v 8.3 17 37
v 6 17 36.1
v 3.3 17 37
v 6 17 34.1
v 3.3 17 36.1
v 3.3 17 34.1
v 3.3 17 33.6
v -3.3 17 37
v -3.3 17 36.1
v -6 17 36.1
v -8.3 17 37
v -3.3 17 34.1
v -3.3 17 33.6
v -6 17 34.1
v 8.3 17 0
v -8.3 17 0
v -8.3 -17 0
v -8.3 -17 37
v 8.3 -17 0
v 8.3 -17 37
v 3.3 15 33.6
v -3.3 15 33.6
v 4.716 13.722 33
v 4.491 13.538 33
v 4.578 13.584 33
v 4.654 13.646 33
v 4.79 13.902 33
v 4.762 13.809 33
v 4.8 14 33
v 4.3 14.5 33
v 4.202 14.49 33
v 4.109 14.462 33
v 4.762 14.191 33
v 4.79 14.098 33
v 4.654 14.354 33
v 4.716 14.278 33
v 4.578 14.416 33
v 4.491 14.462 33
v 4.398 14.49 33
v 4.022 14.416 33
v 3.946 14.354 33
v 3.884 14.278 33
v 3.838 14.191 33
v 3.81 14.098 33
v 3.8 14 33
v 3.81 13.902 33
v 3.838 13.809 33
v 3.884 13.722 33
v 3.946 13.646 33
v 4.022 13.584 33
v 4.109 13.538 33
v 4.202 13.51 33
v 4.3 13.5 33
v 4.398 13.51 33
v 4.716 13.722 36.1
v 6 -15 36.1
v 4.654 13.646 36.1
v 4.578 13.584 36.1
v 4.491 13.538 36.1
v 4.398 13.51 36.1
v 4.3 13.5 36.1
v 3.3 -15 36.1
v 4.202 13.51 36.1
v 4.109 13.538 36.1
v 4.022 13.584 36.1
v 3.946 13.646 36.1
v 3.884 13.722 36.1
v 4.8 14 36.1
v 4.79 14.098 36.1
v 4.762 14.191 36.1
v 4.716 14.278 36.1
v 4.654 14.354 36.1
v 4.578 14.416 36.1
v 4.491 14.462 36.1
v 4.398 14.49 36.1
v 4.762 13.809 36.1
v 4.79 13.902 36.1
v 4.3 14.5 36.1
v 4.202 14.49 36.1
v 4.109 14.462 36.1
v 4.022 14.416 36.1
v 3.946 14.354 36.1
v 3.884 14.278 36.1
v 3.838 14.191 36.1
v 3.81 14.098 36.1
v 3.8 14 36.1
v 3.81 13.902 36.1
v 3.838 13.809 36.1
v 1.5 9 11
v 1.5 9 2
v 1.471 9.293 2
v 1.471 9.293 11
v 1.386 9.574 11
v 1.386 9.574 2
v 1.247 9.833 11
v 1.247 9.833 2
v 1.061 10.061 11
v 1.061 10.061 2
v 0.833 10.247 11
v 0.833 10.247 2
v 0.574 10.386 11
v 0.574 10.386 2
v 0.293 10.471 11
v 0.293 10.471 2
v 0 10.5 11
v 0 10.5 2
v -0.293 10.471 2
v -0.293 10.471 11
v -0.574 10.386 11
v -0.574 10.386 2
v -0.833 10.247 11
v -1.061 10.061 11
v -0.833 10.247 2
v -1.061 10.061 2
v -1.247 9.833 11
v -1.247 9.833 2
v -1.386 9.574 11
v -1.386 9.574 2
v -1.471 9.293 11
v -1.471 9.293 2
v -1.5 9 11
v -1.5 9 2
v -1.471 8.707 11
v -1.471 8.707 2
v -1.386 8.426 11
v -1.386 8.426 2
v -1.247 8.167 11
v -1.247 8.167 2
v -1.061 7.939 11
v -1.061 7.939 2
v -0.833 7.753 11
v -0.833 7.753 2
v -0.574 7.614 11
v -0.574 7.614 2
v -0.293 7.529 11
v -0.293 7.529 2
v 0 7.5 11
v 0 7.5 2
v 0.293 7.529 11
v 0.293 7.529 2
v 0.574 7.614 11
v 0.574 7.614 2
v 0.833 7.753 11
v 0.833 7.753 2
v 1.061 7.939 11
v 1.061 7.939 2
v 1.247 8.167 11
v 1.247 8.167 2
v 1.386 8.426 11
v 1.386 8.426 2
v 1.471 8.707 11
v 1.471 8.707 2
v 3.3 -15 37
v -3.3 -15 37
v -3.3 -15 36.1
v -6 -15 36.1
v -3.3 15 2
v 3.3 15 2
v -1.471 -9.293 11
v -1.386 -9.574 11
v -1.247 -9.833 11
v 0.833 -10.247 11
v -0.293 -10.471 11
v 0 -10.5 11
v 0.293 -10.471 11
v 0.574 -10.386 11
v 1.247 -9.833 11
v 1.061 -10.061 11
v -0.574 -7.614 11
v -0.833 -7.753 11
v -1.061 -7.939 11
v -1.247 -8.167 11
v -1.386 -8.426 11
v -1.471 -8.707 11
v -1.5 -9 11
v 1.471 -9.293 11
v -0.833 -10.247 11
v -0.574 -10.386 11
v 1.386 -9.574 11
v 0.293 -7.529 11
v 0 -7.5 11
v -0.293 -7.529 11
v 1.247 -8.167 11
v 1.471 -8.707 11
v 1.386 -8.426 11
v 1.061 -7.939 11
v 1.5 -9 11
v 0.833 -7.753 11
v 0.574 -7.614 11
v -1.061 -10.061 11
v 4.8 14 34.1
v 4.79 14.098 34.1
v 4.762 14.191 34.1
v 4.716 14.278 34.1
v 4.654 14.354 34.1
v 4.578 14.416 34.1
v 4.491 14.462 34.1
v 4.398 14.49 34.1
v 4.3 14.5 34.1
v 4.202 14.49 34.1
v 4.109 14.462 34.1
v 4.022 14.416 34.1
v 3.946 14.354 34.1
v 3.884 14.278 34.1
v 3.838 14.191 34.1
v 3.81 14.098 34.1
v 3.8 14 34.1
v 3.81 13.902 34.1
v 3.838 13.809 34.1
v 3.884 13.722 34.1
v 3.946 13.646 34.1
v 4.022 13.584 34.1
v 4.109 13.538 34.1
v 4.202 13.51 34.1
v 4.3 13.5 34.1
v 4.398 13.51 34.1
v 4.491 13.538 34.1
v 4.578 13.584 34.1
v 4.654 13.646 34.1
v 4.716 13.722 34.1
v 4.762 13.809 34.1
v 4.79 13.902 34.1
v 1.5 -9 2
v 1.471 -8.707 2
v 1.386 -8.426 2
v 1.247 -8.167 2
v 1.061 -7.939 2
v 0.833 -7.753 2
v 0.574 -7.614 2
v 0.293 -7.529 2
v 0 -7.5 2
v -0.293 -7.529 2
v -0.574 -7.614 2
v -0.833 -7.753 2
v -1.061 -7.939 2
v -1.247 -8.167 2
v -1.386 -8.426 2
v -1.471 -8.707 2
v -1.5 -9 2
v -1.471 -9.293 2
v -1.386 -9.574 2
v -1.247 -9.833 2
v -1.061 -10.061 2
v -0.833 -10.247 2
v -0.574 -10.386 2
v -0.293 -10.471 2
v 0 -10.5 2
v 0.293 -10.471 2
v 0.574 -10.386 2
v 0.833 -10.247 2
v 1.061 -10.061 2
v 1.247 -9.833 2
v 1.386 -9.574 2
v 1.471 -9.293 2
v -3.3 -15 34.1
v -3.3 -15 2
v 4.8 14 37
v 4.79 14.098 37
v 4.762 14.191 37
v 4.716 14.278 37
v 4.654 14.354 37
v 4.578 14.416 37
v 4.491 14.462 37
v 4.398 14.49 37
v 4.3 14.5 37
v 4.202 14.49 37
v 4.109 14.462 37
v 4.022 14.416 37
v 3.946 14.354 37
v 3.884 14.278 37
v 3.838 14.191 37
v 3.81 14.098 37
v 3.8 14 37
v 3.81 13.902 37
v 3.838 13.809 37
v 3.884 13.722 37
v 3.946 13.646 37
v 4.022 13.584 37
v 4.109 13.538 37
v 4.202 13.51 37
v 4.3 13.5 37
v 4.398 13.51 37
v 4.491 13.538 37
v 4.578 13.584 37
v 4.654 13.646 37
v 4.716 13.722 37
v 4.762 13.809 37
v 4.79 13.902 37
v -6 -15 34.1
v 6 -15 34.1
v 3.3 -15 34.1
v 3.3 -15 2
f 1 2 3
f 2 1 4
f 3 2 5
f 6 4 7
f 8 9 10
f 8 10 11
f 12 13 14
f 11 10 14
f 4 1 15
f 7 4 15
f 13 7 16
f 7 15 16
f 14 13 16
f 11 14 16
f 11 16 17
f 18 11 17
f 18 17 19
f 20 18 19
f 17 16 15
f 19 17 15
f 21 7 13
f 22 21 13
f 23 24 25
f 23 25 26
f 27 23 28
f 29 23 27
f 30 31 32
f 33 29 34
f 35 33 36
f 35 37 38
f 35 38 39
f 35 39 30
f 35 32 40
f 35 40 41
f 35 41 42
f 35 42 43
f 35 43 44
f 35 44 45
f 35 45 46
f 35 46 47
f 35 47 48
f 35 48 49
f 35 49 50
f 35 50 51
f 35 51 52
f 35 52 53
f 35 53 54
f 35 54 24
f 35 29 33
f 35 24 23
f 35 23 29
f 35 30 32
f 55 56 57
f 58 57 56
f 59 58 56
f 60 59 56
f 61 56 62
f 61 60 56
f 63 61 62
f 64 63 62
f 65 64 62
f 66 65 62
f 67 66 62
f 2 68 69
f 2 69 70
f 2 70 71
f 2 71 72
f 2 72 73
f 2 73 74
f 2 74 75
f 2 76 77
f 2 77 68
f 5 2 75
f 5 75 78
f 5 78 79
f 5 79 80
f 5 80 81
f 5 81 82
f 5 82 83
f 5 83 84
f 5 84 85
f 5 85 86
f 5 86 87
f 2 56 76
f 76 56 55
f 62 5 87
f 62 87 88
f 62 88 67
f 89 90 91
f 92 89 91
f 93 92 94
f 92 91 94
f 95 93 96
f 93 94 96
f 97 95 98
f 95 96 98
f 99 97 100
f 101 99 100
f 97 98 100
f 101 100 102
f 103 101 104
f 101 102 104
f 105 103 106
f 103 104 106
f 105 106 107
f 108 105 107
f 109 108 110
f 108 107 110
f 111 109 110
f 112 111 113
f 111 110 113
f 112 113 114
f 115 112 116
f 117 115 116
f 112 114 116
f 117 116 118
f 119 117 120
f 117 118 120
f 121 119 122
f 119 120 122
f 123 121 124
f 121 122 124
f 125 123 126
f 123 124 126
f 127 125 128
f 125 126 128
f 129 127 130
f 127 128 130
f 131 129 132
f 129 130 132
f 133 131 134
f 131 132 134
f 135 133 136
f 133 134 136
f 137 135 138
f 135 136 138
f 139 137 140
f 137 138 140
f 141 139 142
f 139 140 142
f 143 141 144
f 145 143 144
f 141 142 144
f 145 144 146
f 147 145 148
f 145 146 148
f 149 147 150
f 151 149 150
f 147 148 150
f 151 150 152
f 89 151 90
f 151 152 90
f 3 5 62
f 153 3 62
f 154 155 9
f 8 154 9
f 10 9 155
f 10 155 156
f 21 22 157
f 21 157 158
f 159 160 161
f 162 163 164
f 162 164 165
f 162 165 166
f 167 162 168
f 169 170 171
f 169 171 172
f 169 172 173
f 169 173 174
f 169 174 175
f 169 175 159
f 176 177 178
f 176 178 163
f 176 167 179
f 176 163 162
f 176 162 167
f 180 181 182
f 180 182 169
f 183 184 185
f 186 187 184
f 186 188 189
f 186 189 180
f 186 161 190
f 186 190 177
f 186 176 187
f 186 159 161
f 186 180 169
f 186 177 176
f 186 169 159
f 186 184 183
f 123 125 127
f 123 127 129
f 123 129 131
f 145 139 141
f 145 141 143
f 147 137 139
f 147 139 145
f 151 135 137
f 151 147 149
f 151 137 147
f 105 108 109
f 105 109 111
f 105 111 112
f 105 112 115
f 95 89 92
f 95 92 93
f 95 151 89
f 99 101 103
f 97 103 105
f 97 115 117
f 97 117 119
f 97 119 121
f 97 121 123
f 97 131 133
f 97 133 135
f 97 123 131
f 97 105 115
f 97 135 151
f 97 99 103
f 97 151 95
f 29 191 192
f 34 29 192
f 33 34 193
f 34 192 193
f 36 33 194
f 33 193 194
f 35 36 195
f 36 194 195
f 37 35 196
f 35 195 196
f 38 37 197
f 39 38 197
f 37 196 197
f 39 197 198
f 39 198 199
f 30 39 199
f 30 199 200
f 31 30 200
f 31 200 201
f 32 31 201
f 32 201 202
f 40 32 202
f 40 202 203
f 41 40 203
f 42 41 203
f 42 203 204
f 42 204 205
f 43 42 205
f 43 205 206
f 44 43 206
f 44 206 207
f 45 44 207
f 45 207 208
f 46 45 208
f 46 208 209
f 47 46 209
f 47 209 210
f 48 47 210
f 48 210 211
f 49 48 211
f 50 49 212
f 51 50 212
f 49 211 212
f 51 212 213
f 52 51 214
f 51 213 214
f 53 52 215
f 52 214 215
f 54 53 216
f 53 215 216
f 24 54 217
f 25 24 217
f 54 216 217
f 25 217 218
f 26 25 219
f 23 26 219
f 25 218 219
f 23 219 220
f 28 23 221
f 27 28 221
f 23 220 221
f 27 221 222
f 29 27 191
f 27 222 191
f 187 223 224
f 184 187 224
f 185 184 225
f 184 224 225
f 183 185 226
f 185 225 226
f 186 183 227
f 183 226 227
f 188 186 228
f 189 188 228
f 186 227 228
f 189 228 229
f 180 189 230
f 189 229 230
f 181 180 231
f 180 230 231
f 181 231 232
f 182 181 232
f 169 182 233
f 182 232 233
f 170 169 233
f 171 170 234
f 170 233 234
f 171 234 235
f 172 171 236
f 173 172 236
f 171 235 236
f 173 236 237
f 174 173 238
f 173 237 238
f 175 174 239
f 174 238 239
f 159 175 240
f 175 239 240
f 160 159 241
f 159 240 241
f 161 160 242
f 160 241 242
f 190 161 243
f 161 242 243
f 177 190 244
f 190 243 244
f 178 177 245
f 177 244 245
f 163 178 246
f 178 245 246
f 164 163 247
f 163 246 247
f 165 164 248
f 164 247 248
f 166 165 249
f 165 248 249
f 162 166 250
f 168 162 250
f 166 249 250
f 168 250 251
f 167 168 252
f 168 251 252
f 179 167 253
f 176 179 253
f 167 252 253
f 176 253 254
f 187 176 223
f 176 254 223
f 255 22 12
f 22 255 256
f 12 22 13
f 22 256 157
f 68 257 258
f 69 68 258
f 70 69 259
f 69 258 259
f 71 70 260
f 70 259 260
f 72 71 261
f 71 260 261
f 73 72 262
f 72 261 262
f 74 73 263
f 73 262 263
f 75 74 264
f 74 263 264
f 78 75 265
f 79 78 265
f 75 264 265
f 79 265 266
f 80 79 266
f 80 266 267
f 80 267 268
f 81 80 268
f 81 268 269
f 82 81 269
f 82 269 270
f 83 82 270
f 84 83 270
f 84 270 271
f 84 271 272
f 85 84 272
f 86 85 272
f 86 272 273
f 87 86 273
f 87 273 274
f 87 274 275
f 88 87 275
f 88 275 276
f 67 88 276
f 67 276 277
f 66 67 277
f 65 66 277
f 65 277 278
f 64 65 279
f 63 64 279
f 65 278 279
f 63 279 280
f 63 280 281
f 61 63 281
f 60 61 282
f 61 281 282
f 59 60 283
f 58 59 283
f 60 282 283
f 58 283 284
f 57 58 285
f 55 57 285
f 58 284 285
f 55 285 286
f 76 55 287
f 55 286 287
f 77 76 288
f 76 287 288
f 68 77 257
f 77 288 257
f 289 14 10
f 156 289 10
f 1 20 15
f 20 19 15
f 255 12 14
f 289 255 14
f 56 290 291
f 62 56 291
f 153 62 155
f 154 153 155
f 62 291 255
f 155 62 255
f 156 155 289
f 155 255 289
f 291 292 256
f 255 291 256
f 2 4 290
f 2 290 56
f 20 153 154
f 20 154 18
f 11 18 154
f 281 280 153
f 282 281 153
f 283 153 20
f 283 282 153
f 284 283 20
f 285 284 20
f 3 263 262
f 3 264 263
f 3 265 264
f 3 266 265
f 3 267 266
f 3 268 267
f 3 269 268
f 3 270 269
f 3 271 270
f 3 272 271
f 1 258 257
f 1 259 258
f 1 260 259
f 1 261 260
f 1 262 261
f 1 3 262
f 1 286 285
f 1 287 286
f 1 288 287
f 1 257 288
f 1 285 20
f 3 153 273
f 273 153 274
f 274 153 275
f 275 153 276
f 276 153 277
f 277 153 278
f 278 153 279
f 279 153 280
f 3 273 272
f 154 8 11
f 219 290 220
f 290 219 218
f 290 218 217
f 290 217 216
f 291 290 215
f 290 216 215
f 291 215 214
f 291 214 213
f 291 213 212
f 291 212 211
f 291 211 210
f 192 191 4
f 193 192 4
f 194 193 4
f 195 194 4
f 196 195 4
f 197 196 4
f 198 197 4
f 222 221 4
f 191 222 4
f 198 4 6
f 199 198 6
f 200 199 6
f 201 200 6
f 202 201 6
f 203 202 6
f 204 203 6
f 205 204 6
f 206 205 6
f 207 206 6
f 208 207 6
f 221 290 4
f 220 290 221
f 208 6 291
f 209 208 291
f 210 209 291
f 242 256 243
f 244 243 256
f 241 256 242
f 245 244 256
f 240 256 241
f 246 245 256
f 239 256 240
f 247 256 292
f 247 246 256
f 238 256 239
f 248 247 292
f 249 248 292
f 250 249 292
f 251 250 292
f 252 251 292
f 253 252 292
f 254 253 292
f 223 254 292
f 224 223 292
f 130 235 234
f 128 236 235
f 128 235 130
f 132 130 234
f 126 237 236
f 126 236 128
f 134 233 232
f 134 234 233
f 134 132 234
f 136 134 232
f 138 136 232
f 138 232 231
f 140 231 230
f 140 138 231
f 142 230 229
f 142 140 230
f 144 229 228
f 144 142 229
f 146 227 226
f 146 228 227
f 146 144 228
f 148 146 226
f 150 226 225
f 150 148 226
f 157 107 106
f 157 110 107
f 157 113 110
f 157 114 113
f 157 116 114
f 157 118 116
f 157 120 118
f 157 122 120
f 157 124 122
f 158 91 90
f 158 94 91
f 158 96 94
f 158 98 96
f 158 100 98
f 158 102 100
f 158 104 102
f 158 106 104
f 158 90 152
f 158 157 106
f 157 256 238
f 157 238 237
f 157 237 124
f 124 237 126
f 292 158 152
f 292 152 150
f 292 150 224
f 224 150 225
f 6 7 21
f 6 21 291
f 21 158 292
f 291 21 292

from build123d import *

# Parameters (mm, degrees)
F0_W      = 6.6
F0_H      = 30
F1_DEPTH  = 2
F0_W_2    = 16.6
F0_H_2    = 34
F2_DEPTH  = 34
F3_R      = 1.5
F4_DEPTH  = 9
F5_W      = 6.6
F5_H      = 0.4
F6_DEPTH  = 25
F8_DEPTH  = 3
F9_W      = 12
F9_H      = 2
F10_DEPTH = 32
F11_R     = 0.5
F12_DEPTH = 4


with BuildPart() as f1:
    # F0 (on Top) → F1 (new body)
    with BuildSketch(Plane.XY):
        Rectangle(F0_W, F0_H)
    extrude(amount=F1_DEPTH)

    # F0 (on Top) → F2 (join)
    with BuildSketch(Plane.XY):
        Rectangle(F0_W_2, F0_H_2)
        Rectangle(F0_W, F0_H, mode=Mode.SUBTRACT)
    extrude(amount=F2_DEPTH)

    # F3 (on face) → F4 (join)
    with BuildSketch(Plane.XY.offset(2)):
        with Locations((0, 9)):
            Circle(F3_R)
        with Locations((0, -9)):
            Circle(F3_R)
    extrude(amount=F4_DEPTH)

    # F5 (on face) → F6 (cut)
    with BuildSketch(Plane(origin=(0, 17, 0), x_dir=(-1, 0, 0), z_dir=(0, 1, 0))):
        with Locations((0, 33.8)):
            Rectangle(F5_W, F5_H)
    extrude(amount=-F6_DEPTH, mode=Mode.SUBTRACT)

    # F7 (on face) → F8 (join)
    with BuildSketch(Plane.XY.offset(34)):
        Polygon((-8.3, -17), (8.3, -17), (8.3, 17), (3.3, 17), (3.3, -15), (-3.3, -15), (-3.3, 17), (-8.3, 17), align=None)
    extrude(amount=F8_DEPTH)

    # F9 (on face) → F10 (cut)
    with BuildSketch(Plane(origin=(0, 17, 0), x_dir=(-1, 0, 0), z_dir=(0, 1, 0))):
        with Locations((0, 35.1)):
            Rectangle(F9_W, F9_H)
    extrude(amount=-F10_DEPTH, mode=Mode.SUBTRACT)

    # F11 (on face) → F12 (cut)
    with BuildSketch(Plane.XY.offset(37)):
        with Locations((4.3, 14)):
            Circle(F11_R)
    extrude(amount=-F12_DEPTH, mode=Mode.SUBTRACT)


solid = f1.part
